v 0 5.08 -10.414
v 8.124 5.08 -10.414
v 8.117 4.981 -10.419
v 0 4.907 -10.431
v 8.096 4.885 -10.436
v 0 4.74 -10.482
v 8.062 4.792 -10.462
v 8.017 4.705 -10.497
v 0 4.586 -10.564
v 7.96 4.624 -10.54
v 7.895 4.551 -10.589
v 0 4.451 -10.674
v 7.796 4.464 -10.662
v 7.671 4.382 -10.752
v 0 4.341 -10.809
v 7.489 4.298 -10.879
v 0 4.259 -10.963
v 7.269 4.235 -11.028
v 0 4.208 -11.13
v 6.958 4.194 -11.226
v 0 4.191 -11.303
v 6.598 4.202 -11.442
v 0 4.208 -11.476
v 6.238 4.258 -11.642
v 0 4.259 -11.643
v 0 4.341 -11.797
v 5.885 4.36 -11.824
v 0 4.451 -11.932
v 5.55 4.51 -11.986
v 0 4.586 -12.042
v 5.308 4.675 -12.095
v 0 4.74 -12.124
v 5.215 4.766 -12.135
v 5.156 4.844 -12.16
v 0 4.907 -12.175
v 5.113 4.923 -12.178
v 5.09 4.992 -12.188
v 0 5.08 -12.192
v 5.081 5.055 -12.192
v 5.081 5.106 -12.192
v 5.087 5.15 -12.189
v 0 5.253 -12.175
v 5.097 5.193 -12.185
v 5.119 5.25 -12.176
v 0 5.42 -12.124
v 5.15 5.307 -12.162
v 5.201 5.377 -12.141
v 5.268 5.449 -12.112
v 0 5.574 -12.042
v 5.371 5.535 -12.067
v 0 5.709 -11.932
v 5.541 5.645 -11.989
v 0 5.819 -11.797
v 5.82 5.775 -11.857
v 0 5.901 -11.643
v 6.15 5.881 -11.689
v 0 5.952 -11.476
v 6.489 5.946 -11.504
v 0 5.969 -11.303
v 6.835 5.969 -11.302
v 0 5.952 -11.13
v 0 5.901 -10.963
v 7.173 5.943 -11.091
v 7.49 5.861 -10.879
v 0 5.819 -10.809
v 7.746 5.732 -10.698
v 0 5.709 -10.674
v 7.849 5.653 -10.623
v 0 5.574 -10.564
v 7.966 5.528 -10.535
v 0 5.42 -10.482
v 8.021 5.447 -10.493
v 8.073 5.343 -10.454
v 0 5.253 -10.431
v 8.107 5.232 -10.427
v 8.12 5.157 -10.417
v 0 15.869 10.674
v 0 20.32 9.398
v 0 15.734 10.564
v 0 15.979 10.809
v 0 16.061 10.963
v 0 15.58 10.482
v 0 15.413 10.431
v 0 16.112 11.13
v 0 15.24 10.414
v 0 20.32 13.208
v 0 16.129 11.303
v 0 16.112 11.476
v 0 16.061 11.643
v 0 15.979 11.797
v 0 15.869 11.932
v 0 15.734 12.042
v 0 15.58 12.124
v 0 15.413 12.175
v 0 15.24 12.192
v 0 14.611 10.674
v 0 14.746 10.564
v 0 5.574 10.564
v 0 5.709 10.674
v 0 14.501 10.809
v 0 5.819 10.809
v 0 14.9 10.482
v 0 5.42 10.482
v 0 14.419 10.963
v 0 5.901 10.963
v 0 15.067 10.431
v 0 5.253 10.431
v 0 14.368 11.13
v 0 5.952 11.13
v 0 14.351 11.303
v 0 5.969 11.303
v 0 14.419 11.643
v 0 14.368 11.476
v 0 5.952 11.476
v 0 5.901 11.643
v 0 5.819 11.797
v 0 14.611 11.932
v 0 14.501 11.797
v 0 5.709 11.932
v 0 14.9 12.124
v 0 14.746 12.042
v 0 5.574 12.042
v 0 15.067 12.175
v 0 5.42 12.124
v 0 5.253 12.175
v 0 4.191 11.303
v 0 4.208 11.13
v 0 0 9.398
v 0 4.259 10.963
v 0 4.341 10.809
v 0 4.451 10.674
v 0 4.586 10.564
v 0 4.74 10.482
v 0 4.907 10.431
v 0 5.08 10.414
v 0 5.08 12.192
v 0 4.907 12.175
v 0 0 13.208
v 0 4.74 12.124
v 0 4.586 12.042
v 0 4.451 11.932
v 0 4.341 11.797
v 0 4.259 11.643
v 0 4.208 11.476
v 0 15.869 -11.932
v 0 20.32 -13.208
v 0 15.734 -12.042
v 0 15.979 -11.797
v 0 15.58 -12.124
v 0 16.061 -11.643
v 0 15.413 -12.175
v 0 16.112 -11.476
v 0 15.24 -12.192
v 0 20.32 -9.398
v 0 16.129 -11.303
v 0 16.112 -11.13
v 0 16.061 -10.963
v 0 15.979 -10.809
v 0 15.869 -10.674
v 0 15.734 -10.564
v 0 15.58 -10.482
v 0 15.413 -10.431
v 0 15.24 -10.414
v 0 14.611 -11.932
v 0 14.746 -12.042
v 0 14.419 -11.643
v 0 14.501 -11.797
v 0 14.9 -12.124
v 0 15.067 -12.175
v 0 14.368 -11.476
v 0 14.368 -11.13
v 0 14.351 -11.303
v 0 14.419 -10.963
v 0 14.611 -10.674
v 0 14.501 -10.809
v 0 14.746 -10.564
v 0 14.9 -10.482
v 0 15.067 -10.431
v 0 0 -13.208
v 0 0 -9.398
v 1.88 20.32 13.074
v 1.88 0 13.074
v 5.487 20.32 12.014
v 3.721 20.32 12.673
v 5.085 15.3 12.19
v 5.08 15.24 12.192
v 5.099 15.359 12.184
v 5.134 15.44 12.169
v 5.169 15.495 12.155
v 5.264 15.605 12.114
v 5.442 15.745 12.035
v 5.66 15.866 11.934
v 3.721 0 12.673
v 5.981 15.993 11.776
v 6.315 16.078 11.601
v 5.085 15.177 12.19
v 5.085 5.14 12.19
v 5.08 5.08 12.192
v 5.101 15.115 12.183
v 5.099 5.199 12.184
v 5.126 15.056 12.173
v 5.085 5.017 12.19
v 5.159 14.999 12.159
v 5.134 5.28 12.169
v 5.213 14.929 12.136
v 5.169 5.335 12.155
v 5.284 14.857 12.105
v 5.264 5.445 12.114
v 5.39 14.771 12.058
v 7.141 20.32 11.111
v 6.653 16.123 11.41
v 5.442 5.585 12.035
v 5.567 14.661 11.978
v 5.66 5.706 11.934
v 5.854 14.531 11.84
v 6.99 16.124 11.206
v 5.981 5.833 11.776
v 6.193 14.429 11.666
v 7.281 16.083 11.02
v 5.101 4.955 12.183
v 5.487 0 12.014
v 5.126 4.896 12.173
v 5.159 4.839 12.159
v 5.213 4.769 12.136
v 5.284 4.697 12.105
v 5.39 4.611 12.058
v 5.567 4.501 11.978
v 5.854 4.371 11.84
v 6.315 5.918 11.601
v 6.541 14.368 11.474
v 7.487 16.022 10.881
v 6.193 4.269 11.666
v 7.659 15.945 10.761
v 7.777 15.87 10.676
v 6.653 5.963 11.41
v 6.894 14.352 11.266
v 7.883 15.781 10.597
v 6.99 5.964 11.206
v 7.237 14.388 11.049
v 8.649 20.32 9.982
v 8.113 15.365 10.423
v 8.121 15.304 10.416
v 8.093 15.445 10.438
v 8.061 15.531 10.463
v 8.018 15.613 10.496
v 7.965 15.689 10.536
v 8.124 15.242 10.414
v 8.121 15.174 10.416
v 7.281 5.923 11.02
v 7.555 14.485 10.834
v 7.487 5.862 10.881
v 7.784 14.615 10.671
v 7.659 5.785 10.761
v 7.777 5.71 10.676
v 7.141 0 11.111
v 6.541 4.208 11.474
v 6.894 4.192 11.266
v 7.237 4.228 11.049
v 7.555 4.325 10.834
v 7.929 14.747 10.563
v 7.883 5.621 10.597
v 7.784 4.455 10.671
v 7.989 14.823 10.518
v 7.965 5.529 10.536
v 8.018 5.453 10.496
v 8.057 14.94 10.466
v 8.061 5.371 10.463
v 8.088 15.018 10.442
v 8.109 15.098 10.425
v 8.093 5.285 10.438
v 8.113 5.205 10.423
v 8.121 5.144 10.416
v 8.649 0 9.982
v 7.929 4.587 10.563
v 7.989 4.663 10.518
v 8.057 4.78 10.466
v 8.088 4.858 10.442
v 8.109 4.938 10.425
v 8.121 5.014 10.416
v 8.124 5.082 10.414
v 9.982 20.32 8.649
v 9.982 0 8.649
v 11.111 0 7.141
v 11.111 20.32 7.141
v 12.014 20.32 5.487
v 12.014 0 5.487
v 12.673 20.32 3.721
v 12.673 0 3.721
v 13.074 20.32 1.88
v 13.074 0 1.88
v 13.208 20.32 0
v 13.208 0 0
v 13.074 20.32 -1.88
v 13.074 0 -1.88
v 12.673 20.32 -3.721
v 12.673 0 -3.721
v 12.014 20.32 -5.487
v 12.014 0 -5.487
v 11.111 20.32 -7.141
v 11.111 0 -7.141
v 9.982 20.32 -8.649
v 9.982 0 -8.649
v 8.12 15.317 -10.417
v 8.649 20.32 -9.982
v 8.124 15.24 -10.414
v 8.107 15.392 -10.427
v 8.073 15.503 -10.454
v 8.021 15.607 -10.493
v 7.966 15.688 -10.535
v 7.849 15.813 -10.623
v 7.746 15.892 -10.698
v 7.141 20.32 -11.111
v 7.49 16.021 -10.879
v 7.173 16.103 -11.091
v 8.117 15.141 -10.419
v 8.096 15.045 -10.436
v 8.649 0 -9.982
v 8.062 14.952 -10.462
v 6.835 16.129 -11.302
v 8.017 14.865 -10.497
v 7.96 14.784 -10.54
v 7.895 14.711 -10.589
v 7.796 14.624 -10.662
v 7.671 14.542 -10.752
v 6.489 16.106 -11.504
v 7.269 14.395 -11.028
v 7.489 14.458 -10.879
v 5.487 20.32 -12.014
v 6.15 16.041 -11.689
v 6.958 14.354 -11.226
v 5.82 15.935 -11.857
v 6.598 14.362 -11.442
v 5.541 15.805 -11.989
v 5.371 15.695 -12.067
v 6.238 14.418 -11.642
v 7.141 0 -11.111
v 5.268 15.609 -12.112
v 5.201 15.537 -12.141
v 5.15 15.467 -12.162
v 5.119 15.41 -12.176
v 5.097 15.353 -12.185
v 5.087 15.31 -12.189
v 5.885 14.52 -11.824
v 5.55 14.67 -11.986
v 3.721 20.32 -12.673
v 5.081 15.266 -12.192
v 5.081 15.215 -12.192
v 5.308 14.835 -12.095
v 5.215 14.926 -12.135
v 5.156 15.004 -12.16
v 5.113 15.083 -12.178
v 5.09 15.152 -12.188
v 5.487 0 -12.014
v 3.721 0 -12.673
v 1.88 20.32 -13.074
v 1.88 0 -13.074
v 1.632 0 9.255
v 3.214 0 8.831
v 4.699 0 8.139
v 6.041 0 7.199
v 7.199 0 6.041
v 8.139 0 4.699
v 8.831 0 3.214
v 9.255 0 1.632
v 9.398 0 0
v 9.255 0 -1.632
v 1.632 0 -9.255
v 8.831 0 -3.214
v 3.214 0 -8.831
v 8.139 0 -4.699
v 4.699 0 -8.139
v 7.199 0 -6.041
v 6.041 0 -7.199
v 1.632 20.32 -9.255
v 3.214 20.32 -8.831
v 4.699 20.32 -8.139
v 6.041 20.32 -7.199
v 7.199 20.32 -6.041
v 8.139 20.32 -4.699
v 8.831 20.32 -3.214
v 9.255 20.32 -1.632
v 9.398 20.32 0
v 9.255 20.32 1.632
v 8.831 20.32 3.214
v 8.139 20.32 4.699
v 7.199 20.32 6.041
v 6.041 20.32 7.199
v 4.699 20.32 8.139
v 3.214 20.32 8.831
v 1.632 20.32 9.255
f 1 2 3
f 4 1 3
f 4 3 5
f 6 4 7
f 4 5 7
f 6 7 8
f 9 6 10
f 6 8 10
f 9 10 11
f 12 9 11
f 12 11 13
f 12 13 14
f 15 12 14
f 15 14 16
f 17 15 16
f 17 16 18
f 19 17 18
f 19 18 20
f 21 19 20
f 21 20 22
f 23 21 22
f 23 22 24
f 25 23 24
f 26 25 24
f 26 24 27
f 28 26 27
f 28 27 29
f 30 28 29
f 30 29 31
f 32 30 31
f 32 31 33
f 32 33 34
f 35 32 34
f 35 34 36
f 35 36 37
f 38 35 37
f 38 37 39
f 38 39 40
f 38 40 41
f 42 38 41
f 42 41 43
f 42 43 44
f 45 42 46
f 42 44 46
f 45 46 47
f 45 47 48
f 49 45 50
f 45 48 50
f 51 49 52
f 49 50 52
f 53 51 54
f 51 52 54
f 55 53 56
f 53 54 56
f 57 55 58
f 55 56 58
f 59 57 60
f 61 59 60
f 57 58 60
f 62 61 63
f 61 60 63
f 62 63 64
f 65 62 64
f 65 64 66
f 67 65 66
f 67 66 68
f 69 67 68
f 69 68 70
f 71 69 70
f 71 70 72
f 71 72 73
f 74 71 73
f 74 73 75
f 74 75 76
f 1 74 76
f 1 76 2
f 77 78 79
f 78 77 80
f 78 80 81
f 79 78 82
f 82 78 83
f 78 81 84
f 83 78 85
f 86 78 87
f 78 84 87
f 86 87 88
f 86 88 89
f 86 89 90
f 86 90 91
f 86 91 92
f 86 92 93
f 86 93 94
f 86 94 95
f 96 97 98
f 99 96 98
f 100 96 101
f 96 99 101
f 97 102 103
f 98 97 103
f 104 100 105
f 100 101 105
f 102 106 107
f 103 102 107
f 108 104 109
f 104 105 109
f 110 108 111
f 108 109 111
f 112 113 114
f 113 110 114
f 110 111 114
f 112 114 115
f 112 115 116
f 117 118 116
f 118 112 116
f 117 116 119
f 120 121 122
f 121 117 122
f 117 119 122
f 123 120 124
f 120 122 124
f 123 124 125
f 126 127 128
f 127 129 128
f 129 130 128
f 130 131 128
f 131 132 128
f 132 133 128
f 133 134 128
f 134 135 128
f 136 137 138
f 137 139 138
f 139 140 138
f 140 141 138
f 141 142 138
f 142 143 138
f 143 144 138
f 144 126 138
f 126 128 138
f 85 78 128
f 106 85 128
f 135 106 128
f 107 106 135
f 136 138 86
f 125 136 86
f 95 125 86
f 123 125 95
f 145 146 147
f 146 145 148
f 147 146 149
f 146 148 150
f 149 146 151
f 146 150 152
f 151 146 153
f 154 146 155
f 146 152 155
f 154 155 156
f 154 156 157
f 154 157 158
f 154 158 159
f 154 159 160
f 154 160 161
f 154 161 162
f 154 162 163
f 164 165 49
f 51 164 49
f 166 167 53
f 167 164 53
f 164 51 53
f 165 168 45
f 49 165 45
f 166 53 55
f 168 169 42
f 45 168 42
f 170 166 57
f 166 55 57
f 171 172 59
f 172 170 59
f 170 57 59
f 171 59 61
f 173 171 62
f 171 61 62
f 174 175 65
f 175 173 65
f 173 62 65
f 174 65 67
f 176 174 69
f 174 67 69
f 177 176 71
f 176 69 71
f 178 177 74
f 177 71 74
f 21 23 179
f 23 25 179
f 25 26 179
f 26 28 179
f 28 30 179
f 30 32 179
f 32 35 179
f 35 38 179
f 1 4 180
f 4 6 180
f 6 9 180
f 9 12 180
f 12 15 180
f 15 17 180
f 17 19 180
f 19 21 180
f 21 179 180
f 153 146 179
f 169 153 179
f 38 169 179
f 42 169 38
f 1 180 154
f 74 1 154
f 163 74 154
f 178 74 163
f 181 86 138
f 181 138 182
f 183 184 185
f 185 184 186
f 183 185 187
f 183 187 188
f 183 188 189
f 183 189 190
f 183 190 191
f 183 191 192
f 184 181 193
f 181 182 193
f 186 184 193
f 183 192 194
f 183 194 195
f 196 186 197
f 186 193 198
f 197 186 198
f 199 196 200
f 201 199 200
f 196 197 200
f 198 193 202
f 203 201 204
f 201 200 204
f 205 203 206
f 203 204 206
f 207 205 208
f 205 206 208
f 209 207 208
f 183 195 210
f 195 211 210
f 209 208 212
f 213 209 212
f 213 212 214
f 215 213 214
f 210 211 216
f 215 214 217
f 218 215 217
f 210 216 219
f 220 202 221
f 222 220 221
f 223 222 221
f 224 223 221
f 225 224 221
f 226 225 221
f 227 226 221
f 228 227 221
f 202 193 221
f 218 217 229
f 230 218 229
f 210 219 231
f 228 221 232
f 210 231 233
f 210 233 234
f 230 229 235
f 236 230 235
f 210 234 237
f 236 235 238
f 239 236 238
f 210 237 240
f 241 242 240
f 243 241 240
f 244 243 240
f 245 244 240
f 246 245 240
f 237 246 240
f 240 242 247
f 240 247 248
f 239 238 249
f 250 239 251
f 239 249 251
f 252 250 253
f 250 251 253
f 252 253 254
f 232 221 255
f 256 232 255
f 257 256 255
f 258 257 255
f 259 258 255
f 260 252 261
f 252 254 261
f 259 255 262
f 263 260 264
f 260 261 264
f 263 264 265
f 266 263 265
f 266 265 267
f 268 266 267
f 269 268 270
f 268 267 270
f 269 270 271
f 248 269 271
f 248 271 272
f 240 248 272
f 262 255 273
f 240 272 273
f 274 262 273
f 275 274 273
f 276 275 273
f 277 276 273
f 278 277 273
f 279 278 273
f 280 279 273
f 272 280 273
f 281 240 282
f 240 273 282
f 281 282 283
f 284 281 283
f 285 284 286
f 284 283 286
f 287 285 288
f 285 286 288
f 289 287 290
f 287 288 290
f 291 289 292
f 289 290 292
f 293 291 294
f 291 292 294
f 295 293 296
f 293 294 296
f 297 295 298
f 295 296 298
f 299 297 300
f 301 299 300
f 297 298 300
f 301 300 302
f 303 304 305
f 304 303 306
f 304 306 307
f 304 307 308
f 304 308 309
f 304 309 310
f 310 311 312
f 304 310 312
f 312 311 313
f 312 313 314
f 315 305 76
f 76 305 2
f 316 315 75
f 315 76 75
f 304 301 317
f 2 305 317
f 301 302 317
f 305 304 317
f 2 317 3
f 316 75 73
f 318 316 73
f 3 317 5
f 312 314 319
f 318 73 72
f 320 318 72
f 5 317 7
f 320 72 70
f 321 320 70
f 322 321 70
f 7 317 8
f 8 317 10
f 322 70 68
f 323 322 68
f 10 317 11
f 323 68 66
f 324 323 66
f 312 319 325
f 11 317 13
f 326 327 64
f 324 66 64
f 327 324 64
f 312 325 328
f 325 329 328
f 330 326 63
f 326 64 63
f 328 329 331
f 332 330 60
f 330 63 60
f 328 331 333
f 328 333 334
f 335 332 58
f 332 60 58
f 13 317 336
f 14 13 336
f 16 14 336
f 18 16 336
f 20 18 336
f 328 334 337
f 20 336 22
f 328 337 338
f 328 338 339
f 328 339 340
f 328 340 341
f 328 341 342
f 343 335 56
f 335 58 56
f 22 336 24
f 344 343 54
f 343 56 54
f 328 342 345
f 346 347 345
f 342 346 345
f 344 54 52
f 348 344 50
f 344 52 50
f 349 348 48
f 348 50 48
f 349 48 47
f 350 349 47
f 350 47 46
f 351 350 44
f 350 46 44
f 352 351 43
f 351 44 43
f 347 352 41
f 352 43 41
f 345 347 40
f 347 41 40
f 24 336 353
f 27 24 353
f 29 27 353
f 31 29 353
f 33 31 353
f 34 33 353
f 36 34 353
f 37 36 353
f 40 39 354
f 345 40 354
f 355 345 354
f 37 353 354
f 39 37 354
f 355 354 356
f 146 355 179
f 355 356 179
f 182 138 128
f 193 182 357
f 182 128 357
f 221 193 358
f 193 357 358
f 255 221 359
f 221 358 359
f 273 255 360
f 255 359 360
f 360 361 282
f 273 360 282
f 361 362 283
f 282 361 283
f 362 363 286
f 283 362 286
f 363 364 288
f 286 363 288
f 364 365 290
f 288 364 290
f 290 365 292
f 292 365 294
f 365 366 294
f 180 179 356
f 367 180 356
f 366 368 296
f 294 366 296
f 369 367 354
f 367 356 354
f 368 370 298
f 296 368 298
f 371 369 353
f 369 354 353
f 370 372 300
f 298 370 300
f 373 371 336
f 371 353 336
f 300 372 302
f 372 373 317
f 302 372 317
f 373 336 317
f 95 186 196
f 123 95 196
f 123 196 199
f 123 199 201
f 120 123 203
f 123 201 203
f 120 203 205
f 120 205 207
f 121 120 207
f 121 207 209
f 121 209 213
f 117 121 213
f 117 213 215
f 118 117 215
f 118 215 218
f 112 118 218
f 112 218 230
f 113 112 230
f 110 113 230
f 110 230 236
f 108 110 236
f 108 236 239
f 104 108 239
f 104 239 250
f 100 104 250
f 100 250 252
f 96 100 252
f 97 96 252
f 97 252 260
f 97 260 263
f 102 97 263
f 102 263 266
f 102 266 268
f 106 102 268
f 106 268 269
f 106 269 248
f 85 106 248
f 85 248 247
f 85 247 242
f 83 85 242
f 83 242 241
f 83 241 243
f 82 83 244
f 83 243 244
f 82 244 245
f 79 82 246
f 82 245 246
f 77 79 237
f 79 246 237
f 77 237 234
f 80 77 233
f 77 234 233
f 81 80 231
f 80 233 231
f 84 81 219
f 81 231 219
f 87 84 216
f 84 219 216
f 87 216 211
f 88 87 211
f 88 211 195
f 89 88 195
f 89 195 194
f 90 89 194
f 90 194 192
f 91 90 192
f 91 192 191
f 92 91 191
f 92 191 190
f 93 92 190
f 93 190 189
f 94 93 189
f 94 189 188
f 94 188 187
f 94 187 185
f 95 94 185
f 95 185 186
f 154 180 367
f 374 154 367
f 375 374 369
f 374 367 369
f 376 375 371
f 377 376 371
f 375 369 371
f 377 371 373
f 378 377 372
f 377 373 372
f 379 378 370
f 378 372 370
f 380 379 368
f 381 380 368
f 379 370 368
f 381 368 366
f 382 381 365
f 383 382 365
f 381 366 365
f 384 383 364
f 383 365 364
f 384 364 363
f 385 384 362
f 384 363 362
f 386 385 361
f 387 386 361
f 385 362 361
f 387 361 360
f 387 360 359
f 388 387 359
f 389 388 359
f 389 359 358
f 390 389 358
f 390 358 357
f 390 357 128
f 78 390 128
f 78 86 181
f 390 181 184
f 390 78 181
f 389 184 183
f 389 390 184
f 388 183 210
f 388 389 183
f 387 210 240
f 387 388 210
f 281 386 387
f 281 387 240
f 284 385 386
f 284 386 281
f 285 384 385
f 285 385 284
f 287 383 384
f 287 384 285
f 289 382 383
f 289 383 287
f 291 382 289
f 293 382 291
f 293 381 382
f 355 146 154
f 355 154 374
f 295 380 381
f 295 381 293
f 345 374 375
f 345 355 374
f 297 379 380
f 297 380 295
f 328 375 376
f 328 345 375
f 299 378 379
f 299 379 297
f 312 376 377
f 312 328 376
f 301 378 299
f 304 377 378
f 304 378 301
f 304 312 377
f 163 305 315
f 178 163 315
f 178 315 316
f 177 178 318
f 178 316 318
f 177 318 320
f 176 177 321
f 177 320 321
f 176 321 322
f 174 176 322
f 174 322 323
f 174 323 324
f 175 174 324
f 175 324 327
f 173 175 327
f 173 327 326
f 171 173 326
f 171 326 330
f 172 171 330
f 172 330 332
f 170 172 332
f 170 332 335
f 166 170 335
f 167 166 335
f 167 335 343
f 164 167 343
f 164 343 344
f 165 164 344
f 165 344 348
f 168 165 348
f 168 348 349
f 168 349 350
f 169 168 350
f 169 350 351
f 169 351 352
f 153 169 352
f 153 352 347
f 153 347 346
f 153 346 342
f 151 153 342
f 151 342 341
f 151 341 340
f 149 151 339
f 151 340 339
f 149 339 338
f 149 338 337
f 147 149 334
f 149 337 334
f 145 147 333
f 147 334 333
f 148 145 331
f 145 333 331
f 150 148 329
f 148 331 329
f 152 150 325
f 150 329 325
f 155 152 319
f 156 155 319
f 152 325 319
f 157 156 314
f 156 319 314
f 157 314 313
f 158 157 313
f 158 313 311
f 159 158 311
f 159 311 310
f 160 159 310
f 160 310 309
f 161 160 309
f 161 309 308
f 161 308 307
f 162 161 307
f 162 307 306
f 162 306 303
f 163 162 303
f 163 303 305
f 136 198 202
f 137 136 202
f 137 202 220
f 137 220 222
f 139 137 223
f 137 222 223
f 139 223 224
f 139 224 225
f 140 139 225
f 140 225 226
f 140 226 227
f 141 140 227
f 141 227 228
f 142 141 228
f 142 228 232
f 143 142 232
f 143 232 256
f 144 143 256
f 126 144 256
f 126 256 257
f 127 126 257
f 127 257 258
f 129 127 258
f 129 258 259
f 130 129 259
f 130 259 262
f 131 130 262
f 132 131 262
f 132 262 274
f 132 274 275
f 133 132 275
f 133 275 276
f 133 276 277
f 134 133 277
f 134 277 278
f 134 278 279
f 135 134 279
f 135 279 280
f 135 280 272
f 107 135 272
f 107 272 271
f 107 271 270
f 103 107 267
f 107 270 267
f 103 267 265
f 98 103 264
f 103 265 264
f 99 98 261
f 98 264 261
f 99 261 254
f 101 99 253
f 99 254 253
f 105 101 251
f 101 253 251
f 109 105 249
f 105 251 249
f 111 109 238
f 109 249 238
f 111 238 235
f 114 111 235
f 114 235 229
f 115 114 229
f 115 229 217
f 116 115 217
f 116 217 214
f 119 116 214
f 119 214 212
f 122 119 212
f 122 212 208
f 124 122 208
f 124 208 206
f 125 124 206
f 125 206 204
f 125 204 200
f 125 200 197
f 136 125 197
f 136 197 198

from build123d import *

# Parameters (mm, degrees)
BOSS_EXTRUDE1_DEPTH       = 20.32
TAP_DRILL_FOR_2_56_TAP1_D = 1.778


with BuildPart() as part:
    # Sketch1 → Boss-Extrude1 (new body)
    with BuildSketch(Plane(origin=(0, 0, 0), x_dir=(1, 0, 0), z_dir=(0, 1, 0))):
        with BuildLine():
            Line((0, 13.208), (0, 9.398))
            ThreePointArc((0, 9.398), (9.398, 0), (0, -9.398))
            Line((0, -9.398), (0, -13.208))
            ThreePointArc((0, -13.208), (13.208, 0), (0, 13.208))
        make_face()
    extrude(amount=BOSS_EXTRUDE1_DEPTH)

    # Tap Drill for #2-56 Tap1 (through all)
    with Locations(Plane(origin=(0, 15.24, -11.303), x_dir=(0, 0, -1), z_dir=(-1, 0, 0))):
        with Locations((0, 0), (-22.606, 0), (-22.606, 10.16), (0, 10.16)):
            Hole(TAP_DRILL_FOR_2_56_TAP1_D / 2)


solid = part.part
